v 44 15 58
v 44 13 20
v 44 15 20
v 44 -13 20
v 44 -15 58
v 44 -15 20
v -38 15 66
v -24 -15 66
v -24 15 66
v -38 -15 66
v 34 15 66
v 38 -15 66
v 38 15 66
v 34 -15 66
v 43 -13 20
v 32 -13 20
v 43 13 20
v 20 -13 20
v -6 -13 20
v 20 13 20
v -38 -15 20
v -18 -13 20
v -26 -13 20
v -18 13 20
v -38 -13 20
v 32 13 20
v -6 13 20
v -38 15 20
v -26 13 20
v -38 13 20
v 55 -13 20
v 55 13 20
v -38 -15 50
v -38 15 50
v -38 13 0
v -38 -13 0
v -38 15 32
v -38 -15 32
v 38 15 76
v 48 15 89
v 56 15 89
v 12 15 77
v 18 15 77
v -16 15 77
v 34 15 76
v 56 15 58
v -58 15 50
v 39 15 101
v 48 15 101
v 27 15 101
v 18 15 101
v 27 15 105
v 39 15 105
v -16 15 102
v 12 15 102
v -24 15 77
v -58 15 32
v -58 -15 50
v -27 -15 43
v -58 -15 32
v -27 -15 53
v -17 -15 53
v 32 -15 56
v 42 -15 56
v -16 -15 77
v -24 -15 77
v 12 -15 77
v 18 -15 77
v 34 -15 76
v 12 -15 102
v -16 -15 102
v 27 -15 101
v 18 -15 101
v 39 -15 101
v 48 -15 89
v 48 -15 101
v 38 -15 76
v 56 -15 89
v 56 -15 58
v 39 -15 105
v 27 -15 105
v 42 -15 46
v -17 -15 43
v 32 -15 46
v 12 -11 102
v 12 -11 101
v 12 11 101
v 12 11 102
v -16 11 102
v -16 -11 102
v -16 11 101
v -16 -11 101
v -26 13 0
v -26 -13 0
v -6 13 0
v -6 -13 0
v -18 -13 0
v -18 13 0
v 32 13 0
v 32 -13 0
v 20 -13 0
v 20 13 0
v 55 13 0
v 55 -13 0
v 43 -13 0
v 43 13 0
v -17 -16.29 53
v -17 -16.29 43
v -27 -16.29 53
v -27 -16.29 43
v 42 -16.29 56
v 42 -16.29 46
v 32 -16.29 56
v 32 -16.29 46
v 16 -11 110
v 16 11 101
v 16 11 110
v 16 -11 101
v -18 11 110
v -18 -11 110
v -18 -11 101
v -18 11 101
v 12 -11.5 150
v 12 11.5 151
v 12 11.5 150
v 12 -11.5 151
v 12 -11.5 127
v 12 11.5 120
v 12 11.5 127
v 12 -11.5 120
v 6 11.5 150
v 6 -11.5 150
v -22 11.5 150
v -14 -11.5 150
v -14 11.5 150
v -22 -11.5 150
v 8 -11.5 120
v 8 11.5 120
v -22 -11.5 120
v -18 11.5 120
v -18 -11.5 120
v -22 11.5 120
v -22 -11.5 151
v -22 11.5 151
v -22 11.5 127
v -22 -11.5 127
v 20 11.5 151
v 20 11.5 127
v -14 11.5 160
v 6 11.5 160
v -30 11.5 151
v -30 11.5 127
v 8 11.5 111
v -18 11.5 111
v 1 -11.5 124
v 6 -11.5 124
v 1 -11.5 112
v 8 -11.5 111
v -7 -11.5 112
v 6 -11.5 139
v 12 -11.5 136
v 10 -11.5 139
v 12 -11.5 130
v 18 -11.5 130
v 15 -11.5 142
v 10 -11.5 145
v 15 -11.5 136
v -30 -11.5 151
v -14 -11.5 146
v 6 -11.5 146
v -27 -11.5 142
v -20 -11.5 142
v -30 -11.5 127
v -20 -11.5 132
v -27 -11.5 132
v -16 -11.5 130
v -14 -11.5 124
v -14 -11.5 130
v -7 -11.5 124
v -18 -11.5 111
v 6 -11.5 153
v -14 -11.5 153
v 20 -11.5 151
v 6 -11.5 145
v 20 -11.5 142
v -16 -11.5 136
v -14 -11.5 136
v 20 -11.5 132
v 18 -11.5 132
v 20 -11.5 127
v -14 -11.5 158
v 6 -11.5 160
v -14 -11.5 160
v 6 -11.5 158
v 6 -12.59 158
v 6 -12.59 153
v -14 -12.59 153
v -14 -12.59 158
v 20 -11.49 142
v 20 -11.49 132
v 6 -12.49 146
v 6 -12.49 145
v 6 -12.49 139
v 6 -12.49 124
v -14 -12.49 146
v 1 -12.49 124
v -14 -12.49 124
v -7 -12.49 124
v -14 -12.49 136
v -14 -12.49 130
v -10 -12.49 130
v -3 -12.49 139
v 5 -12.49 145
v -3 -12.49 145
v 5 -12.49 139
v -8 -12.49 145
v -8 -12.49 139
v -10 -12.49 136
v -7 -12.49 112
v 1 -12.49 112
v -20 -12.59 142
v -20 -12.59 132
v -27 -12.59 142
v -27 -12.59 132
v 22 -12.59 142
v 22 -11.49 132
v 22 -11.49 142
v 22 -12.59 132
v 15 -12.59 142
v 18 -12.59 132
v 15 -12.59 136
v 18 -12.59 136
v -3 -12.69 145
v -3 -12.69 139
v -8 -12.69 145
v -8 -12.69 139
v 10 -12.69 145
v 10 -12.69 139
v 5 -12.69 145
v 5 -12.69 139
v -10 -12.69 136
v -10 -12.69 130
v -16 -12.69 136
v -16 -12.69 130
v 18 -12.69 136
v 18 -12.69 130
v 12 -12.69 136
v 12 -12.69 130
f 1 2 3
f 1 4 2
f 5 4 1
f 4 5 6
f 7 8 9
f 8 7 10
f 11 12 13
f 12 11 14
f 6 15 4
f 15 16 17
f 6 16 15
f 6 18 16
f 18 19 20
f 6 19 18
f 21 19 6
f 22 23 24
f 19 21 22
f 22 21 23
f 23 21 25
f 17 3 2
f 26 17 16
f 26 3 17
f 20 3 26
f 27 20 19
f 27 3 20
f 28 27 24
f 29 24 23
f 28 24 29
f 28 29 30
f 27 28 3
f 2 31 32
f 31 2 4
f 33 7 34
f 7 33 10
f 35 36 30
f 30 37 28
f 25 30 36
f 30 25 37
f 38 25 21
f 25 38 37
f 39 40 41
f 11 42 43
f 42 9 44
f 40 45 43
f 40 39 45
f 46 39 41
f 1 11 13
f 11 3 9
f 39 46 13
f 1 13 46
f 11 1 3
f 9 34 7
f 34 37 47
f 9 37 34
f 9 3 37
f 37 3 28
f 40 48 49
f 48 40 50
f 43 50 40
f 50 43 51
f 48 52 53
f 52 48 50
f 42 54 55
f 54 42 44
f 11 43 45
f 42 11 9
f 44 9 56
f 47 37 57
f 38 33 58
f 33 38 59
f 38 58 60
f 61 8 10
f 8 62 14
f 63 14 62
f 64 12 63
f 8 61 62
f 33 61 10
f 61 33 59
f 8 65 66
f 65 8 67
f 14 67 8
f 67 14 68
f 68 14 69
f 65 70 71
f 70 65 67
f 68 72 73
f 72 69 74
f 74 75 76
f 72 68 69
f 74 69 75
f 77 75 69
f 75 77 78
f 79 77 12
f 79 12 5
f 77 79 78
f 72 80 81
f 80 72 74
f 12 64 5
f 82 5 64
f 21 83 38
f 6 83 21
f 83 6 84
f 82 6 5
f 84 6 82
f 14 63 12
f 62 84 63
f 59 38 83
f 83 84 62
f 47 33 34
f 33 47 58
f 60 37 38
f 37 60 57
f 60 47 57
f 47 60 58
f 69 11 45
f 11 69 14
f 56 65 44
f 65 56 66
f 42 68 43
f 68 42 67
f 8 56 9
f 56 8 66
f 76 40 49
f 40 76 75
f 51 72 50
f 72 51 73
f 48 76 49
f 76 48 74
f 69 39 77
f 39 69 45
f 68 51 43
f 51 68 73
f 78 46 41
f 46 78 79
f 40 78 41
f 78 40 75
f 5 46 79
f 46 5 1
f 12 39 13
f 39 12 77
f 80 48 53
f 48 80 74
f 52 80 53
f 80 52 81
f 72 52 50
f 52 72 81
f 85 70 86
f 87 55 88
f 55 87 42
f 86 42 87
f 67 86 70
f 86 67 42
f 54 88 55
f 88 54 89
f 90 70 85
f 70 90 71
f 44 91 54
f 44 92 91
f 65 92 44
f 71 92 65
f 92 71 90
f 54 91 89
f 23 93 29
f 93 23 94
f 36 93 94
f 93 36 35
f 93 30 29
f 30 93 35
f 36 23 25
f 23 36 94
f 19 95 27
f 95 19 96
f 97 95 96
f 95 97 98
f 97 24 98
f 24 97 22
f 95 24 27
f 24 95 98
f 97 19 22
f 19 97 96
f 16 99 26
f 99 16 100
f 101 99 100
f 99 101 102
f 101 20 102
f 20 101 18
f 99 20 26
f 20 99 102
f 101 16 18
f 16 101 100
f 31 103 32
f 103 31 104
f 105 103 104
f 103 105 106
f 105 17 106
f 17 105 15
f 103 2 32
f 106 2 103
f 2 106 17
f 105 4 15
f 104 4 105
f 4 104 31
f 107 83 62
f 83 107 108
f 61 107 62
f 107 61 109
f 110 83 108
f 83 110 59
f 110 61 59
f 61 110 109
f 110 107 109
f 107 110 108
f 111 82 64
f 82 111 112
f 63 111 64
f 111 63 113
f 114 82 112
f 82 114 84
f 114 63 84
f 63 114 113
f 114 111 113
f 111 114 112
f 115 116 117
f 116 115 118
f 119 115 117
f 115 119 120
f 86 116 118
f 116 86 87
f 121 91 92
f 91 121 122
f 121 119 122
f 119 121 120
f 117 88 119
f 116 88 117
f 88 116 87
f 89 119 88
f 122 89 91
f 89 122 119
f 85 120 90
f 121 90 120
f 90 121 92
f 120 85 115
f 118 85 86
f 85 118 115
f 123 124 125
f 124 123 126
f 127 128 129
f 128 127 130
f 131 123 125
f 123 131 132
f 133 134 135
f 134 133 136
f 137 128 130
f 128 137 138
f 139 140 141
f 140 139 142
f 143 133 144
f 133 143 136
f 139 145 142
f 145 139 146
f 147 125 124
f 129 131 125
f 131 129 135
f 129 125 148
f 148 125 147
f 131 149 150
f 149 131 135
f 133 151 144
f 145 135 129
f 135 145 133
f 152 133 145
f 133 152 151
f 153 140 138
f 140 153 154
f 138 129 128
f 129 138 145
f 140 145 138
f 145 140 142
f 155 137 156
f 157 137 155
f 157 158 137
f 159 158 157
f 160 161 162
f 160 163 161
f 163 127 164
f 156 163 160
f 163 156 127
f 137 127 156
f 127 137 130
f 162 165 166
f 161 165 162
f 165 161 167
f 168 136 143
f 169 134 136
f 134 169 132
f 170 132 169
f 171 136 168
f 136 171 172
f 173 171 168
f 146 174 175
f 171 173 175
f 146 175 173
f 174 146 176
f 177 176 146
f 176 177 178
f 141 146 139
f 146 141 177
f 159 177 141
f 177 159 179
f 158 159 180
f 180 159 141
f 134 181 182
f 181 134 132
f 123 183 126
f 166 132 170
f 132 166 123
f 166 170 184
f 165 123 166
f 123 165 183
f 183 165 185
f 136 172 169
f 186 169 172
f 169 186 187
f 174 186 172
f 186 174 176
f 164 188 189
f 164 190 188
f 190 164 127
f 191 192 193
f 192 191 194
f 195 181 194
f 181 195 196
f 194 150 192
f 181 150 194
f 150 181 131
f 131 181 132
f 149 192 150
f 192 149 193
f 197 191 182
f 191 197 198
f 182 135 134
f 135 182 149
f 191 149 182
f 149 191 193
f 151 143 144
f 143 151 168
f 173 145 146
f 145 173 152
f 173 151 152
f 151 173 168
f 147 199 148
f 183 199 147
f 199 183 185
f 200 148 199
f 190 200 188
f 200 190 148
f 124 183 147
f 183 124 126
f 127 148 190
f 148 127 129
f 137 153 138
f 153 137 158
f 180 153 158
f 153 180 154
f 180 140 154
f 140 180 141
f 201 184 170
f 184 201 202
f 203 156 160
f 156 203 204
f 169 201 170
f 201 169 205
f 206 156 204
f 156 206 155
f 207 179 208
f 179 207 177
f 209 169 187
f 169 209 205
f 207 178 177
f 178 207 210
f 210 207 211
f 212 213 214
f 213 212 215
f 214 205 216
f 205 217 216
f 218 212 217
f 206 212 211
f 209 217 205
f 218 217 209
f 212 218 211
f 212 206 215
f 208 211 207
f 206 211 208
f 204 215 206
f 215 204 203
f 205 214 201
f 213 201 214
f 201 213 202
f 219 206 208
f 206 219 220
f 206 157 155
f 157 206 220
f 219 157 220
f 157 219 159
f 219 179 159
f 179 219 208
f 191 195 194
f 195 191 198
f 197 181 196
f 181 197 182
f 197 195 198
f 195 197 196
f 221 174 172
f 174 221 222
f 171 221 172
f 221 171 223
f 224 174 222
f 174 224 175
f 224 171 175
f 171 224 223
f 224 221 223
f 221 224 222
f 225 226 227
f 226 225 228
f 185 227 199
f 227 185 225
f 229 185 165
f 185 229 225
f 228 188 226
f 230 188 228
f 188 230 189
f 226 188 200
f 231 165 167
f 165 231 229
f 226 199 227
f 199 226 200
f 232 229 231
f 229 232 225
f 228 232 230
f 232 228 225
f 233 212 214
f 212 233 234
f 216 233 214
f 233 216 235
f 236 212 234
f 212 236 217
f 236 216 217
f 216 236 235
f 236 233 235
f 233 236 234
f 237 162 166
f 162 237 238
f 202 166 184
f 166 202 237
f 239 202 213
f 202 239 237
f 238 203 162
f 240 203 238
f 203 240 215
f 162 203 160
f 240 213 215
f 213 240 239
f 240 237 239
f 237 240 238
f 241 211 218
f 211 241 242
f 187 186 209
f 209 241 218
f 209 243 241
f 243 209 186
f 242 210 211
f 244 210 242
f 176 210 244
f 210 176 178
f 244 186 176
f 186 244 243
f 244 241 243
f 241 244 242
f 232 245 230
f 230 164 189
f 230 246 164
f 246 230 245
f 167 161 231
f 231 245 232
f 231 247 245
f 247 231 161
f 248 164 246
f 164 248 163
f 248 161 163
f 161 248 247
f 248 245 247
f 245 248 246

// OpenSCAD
// Lightbulb Marker - Version 004
// True 3D voxel-style interpretation of the reference.
// Changes from previous version:
// - Kept the white sticker outline out of the printable model.
// - Added an orange structural neck so the bulb is physically connected.
// - Removed fake front-facing side-color blocks that read like flat artwork.
// - Preserved chunky 3D body depth with shallow raised face and bulb details.

eps = 0.01;
$fn = 32;

body_depth = 30;
leg_depth = 26;
neck_depth = 26;
bulb_depth = 23;
detail_raise = 1.1;

orange = [0.84, 0.40, 0.26];
black = [0.02, 0.02, 0.02];
bulb_yellow = [1.00, 0.82, 0.38];
bulb_light = [1.00, 0.90, 0.58];
bulb_orange = [0.93, 0.54, 0.20];
bulb_red = [0.70, 0.22, 0.18];
base_gray = [0.60, 0.60, 0.55];
base_dark = [0.38, 0.39, 0.36];

// Rectangles are [x, z, width, height] in the front silhouette.
body_core = [
    [-38, 20, 82, 46],   // main body mass
    [-58, 32, 20, 18],   // left block protrusion
    [-24, 62, 58, 15],   // stepped upper back
    [18, 76, 30, 25],    // tall right shoulder
    [38, 58, 18, 31],    // right face block
    [27, 96, 12, 9],     // small top step
    [-16, 76, 28, 26]    // real 3D neck/post for the bulb socket
];

leg_blocks = [
    [-38, 0, 12, 20],
    [-18, 0, 12, 20],
    [20, 0, 12, 20],
    [43, 0, 12, 20]
];

eye_blocks = [
    [-27, 43, 10, 10],
    [32, 46, 10, 10]
];

socket_blocks = [
    [-18, 101, 34, 9],
    [-14, 94, 26, 8]
];

bulb_blocks = [
    [-22, 120, 34, 30],  // central bulb body
    [-14, 150, 20, 10],  // top cap
    [-30, 127, 8, 24],   // left side lobe
    [12, 127, 8, 24],    // right side lobe
    [-18, 111, 26, 10]   // lower bulb neck
];

bulb_light_blocks = [
    [-14, 124, 20, 22],
    [-7, 112, 8, 12]
];

bulb_orange_blocks = [
    [-14, 153, 20, 5],
    [-27, 132, 7, 10],
    [15, 132, 7, 10]
];

bulb_red_blocks = [
    [-8, 139, 5, 6],
    [5, 139, 5, 6],
    [-16, 130, 6, 6],
    [12, 130, 6, 6]
];

module block3d(x, z, w, d, h, col) {
    color(col)
        translate([x, -d / 2, z])
            cube([w, d, h]);
}

module blocks3d(rects, d, col) {
    union() {
        for (r = rects)
            block3d(r[0], r[1], r[2], d, r[3], col);
    }
}

module front_detail(x, z, w, h, base_depth, col, raise = detail_raise) {
    color(col)
        translate([x, -base_depth / 2 - raise + eps, z])
            cube([w, raise, h]);
}

module front_details(rects, base_depth, col, raise = detail_raise) {
    union() {
        for (r = rects)
            front_detail(r[0], r[1], r[2], r[3], base_depth, col, raise);
    }
}

module orange_body() {
    union() {
        blocks3d(body_core, body_depth, orange);
        blocks3d(leg_blocks, leg_depth, orange);
        front_details(eye_blocks, body_depth, black, 1.3);
    }
}

module socket() {
    union() {
        block3d(socket_blocks[0][0], socket_blocks[0][1], socket_blocks[0][2], 22, socket_blocks[0][3], base_gray);
        block3d(socket_blocks[1][0], socket_blocks[1][1], socket_blocks[1][2], 20, socket_blocks[1][3], base_dark);
    }
}

module chunky_bulb() {
    union() {
        blocks3d(bulb_blocks, bulb_depth, bulb_yellow);
        front_details(bulb_light_blocks, bulb_depth, bulb_light, 1.0);
        front_details(bulb_orange_blocks, bulb_depth, bulb_orange, 1.1);
        front_details(bulb_red_blocks, bulb_depth, bulb_red, 1.2);
    }
}

module model() {
    union() {
        orange_body();
        socket();
        chunky_bulb();
    }
}

model();
